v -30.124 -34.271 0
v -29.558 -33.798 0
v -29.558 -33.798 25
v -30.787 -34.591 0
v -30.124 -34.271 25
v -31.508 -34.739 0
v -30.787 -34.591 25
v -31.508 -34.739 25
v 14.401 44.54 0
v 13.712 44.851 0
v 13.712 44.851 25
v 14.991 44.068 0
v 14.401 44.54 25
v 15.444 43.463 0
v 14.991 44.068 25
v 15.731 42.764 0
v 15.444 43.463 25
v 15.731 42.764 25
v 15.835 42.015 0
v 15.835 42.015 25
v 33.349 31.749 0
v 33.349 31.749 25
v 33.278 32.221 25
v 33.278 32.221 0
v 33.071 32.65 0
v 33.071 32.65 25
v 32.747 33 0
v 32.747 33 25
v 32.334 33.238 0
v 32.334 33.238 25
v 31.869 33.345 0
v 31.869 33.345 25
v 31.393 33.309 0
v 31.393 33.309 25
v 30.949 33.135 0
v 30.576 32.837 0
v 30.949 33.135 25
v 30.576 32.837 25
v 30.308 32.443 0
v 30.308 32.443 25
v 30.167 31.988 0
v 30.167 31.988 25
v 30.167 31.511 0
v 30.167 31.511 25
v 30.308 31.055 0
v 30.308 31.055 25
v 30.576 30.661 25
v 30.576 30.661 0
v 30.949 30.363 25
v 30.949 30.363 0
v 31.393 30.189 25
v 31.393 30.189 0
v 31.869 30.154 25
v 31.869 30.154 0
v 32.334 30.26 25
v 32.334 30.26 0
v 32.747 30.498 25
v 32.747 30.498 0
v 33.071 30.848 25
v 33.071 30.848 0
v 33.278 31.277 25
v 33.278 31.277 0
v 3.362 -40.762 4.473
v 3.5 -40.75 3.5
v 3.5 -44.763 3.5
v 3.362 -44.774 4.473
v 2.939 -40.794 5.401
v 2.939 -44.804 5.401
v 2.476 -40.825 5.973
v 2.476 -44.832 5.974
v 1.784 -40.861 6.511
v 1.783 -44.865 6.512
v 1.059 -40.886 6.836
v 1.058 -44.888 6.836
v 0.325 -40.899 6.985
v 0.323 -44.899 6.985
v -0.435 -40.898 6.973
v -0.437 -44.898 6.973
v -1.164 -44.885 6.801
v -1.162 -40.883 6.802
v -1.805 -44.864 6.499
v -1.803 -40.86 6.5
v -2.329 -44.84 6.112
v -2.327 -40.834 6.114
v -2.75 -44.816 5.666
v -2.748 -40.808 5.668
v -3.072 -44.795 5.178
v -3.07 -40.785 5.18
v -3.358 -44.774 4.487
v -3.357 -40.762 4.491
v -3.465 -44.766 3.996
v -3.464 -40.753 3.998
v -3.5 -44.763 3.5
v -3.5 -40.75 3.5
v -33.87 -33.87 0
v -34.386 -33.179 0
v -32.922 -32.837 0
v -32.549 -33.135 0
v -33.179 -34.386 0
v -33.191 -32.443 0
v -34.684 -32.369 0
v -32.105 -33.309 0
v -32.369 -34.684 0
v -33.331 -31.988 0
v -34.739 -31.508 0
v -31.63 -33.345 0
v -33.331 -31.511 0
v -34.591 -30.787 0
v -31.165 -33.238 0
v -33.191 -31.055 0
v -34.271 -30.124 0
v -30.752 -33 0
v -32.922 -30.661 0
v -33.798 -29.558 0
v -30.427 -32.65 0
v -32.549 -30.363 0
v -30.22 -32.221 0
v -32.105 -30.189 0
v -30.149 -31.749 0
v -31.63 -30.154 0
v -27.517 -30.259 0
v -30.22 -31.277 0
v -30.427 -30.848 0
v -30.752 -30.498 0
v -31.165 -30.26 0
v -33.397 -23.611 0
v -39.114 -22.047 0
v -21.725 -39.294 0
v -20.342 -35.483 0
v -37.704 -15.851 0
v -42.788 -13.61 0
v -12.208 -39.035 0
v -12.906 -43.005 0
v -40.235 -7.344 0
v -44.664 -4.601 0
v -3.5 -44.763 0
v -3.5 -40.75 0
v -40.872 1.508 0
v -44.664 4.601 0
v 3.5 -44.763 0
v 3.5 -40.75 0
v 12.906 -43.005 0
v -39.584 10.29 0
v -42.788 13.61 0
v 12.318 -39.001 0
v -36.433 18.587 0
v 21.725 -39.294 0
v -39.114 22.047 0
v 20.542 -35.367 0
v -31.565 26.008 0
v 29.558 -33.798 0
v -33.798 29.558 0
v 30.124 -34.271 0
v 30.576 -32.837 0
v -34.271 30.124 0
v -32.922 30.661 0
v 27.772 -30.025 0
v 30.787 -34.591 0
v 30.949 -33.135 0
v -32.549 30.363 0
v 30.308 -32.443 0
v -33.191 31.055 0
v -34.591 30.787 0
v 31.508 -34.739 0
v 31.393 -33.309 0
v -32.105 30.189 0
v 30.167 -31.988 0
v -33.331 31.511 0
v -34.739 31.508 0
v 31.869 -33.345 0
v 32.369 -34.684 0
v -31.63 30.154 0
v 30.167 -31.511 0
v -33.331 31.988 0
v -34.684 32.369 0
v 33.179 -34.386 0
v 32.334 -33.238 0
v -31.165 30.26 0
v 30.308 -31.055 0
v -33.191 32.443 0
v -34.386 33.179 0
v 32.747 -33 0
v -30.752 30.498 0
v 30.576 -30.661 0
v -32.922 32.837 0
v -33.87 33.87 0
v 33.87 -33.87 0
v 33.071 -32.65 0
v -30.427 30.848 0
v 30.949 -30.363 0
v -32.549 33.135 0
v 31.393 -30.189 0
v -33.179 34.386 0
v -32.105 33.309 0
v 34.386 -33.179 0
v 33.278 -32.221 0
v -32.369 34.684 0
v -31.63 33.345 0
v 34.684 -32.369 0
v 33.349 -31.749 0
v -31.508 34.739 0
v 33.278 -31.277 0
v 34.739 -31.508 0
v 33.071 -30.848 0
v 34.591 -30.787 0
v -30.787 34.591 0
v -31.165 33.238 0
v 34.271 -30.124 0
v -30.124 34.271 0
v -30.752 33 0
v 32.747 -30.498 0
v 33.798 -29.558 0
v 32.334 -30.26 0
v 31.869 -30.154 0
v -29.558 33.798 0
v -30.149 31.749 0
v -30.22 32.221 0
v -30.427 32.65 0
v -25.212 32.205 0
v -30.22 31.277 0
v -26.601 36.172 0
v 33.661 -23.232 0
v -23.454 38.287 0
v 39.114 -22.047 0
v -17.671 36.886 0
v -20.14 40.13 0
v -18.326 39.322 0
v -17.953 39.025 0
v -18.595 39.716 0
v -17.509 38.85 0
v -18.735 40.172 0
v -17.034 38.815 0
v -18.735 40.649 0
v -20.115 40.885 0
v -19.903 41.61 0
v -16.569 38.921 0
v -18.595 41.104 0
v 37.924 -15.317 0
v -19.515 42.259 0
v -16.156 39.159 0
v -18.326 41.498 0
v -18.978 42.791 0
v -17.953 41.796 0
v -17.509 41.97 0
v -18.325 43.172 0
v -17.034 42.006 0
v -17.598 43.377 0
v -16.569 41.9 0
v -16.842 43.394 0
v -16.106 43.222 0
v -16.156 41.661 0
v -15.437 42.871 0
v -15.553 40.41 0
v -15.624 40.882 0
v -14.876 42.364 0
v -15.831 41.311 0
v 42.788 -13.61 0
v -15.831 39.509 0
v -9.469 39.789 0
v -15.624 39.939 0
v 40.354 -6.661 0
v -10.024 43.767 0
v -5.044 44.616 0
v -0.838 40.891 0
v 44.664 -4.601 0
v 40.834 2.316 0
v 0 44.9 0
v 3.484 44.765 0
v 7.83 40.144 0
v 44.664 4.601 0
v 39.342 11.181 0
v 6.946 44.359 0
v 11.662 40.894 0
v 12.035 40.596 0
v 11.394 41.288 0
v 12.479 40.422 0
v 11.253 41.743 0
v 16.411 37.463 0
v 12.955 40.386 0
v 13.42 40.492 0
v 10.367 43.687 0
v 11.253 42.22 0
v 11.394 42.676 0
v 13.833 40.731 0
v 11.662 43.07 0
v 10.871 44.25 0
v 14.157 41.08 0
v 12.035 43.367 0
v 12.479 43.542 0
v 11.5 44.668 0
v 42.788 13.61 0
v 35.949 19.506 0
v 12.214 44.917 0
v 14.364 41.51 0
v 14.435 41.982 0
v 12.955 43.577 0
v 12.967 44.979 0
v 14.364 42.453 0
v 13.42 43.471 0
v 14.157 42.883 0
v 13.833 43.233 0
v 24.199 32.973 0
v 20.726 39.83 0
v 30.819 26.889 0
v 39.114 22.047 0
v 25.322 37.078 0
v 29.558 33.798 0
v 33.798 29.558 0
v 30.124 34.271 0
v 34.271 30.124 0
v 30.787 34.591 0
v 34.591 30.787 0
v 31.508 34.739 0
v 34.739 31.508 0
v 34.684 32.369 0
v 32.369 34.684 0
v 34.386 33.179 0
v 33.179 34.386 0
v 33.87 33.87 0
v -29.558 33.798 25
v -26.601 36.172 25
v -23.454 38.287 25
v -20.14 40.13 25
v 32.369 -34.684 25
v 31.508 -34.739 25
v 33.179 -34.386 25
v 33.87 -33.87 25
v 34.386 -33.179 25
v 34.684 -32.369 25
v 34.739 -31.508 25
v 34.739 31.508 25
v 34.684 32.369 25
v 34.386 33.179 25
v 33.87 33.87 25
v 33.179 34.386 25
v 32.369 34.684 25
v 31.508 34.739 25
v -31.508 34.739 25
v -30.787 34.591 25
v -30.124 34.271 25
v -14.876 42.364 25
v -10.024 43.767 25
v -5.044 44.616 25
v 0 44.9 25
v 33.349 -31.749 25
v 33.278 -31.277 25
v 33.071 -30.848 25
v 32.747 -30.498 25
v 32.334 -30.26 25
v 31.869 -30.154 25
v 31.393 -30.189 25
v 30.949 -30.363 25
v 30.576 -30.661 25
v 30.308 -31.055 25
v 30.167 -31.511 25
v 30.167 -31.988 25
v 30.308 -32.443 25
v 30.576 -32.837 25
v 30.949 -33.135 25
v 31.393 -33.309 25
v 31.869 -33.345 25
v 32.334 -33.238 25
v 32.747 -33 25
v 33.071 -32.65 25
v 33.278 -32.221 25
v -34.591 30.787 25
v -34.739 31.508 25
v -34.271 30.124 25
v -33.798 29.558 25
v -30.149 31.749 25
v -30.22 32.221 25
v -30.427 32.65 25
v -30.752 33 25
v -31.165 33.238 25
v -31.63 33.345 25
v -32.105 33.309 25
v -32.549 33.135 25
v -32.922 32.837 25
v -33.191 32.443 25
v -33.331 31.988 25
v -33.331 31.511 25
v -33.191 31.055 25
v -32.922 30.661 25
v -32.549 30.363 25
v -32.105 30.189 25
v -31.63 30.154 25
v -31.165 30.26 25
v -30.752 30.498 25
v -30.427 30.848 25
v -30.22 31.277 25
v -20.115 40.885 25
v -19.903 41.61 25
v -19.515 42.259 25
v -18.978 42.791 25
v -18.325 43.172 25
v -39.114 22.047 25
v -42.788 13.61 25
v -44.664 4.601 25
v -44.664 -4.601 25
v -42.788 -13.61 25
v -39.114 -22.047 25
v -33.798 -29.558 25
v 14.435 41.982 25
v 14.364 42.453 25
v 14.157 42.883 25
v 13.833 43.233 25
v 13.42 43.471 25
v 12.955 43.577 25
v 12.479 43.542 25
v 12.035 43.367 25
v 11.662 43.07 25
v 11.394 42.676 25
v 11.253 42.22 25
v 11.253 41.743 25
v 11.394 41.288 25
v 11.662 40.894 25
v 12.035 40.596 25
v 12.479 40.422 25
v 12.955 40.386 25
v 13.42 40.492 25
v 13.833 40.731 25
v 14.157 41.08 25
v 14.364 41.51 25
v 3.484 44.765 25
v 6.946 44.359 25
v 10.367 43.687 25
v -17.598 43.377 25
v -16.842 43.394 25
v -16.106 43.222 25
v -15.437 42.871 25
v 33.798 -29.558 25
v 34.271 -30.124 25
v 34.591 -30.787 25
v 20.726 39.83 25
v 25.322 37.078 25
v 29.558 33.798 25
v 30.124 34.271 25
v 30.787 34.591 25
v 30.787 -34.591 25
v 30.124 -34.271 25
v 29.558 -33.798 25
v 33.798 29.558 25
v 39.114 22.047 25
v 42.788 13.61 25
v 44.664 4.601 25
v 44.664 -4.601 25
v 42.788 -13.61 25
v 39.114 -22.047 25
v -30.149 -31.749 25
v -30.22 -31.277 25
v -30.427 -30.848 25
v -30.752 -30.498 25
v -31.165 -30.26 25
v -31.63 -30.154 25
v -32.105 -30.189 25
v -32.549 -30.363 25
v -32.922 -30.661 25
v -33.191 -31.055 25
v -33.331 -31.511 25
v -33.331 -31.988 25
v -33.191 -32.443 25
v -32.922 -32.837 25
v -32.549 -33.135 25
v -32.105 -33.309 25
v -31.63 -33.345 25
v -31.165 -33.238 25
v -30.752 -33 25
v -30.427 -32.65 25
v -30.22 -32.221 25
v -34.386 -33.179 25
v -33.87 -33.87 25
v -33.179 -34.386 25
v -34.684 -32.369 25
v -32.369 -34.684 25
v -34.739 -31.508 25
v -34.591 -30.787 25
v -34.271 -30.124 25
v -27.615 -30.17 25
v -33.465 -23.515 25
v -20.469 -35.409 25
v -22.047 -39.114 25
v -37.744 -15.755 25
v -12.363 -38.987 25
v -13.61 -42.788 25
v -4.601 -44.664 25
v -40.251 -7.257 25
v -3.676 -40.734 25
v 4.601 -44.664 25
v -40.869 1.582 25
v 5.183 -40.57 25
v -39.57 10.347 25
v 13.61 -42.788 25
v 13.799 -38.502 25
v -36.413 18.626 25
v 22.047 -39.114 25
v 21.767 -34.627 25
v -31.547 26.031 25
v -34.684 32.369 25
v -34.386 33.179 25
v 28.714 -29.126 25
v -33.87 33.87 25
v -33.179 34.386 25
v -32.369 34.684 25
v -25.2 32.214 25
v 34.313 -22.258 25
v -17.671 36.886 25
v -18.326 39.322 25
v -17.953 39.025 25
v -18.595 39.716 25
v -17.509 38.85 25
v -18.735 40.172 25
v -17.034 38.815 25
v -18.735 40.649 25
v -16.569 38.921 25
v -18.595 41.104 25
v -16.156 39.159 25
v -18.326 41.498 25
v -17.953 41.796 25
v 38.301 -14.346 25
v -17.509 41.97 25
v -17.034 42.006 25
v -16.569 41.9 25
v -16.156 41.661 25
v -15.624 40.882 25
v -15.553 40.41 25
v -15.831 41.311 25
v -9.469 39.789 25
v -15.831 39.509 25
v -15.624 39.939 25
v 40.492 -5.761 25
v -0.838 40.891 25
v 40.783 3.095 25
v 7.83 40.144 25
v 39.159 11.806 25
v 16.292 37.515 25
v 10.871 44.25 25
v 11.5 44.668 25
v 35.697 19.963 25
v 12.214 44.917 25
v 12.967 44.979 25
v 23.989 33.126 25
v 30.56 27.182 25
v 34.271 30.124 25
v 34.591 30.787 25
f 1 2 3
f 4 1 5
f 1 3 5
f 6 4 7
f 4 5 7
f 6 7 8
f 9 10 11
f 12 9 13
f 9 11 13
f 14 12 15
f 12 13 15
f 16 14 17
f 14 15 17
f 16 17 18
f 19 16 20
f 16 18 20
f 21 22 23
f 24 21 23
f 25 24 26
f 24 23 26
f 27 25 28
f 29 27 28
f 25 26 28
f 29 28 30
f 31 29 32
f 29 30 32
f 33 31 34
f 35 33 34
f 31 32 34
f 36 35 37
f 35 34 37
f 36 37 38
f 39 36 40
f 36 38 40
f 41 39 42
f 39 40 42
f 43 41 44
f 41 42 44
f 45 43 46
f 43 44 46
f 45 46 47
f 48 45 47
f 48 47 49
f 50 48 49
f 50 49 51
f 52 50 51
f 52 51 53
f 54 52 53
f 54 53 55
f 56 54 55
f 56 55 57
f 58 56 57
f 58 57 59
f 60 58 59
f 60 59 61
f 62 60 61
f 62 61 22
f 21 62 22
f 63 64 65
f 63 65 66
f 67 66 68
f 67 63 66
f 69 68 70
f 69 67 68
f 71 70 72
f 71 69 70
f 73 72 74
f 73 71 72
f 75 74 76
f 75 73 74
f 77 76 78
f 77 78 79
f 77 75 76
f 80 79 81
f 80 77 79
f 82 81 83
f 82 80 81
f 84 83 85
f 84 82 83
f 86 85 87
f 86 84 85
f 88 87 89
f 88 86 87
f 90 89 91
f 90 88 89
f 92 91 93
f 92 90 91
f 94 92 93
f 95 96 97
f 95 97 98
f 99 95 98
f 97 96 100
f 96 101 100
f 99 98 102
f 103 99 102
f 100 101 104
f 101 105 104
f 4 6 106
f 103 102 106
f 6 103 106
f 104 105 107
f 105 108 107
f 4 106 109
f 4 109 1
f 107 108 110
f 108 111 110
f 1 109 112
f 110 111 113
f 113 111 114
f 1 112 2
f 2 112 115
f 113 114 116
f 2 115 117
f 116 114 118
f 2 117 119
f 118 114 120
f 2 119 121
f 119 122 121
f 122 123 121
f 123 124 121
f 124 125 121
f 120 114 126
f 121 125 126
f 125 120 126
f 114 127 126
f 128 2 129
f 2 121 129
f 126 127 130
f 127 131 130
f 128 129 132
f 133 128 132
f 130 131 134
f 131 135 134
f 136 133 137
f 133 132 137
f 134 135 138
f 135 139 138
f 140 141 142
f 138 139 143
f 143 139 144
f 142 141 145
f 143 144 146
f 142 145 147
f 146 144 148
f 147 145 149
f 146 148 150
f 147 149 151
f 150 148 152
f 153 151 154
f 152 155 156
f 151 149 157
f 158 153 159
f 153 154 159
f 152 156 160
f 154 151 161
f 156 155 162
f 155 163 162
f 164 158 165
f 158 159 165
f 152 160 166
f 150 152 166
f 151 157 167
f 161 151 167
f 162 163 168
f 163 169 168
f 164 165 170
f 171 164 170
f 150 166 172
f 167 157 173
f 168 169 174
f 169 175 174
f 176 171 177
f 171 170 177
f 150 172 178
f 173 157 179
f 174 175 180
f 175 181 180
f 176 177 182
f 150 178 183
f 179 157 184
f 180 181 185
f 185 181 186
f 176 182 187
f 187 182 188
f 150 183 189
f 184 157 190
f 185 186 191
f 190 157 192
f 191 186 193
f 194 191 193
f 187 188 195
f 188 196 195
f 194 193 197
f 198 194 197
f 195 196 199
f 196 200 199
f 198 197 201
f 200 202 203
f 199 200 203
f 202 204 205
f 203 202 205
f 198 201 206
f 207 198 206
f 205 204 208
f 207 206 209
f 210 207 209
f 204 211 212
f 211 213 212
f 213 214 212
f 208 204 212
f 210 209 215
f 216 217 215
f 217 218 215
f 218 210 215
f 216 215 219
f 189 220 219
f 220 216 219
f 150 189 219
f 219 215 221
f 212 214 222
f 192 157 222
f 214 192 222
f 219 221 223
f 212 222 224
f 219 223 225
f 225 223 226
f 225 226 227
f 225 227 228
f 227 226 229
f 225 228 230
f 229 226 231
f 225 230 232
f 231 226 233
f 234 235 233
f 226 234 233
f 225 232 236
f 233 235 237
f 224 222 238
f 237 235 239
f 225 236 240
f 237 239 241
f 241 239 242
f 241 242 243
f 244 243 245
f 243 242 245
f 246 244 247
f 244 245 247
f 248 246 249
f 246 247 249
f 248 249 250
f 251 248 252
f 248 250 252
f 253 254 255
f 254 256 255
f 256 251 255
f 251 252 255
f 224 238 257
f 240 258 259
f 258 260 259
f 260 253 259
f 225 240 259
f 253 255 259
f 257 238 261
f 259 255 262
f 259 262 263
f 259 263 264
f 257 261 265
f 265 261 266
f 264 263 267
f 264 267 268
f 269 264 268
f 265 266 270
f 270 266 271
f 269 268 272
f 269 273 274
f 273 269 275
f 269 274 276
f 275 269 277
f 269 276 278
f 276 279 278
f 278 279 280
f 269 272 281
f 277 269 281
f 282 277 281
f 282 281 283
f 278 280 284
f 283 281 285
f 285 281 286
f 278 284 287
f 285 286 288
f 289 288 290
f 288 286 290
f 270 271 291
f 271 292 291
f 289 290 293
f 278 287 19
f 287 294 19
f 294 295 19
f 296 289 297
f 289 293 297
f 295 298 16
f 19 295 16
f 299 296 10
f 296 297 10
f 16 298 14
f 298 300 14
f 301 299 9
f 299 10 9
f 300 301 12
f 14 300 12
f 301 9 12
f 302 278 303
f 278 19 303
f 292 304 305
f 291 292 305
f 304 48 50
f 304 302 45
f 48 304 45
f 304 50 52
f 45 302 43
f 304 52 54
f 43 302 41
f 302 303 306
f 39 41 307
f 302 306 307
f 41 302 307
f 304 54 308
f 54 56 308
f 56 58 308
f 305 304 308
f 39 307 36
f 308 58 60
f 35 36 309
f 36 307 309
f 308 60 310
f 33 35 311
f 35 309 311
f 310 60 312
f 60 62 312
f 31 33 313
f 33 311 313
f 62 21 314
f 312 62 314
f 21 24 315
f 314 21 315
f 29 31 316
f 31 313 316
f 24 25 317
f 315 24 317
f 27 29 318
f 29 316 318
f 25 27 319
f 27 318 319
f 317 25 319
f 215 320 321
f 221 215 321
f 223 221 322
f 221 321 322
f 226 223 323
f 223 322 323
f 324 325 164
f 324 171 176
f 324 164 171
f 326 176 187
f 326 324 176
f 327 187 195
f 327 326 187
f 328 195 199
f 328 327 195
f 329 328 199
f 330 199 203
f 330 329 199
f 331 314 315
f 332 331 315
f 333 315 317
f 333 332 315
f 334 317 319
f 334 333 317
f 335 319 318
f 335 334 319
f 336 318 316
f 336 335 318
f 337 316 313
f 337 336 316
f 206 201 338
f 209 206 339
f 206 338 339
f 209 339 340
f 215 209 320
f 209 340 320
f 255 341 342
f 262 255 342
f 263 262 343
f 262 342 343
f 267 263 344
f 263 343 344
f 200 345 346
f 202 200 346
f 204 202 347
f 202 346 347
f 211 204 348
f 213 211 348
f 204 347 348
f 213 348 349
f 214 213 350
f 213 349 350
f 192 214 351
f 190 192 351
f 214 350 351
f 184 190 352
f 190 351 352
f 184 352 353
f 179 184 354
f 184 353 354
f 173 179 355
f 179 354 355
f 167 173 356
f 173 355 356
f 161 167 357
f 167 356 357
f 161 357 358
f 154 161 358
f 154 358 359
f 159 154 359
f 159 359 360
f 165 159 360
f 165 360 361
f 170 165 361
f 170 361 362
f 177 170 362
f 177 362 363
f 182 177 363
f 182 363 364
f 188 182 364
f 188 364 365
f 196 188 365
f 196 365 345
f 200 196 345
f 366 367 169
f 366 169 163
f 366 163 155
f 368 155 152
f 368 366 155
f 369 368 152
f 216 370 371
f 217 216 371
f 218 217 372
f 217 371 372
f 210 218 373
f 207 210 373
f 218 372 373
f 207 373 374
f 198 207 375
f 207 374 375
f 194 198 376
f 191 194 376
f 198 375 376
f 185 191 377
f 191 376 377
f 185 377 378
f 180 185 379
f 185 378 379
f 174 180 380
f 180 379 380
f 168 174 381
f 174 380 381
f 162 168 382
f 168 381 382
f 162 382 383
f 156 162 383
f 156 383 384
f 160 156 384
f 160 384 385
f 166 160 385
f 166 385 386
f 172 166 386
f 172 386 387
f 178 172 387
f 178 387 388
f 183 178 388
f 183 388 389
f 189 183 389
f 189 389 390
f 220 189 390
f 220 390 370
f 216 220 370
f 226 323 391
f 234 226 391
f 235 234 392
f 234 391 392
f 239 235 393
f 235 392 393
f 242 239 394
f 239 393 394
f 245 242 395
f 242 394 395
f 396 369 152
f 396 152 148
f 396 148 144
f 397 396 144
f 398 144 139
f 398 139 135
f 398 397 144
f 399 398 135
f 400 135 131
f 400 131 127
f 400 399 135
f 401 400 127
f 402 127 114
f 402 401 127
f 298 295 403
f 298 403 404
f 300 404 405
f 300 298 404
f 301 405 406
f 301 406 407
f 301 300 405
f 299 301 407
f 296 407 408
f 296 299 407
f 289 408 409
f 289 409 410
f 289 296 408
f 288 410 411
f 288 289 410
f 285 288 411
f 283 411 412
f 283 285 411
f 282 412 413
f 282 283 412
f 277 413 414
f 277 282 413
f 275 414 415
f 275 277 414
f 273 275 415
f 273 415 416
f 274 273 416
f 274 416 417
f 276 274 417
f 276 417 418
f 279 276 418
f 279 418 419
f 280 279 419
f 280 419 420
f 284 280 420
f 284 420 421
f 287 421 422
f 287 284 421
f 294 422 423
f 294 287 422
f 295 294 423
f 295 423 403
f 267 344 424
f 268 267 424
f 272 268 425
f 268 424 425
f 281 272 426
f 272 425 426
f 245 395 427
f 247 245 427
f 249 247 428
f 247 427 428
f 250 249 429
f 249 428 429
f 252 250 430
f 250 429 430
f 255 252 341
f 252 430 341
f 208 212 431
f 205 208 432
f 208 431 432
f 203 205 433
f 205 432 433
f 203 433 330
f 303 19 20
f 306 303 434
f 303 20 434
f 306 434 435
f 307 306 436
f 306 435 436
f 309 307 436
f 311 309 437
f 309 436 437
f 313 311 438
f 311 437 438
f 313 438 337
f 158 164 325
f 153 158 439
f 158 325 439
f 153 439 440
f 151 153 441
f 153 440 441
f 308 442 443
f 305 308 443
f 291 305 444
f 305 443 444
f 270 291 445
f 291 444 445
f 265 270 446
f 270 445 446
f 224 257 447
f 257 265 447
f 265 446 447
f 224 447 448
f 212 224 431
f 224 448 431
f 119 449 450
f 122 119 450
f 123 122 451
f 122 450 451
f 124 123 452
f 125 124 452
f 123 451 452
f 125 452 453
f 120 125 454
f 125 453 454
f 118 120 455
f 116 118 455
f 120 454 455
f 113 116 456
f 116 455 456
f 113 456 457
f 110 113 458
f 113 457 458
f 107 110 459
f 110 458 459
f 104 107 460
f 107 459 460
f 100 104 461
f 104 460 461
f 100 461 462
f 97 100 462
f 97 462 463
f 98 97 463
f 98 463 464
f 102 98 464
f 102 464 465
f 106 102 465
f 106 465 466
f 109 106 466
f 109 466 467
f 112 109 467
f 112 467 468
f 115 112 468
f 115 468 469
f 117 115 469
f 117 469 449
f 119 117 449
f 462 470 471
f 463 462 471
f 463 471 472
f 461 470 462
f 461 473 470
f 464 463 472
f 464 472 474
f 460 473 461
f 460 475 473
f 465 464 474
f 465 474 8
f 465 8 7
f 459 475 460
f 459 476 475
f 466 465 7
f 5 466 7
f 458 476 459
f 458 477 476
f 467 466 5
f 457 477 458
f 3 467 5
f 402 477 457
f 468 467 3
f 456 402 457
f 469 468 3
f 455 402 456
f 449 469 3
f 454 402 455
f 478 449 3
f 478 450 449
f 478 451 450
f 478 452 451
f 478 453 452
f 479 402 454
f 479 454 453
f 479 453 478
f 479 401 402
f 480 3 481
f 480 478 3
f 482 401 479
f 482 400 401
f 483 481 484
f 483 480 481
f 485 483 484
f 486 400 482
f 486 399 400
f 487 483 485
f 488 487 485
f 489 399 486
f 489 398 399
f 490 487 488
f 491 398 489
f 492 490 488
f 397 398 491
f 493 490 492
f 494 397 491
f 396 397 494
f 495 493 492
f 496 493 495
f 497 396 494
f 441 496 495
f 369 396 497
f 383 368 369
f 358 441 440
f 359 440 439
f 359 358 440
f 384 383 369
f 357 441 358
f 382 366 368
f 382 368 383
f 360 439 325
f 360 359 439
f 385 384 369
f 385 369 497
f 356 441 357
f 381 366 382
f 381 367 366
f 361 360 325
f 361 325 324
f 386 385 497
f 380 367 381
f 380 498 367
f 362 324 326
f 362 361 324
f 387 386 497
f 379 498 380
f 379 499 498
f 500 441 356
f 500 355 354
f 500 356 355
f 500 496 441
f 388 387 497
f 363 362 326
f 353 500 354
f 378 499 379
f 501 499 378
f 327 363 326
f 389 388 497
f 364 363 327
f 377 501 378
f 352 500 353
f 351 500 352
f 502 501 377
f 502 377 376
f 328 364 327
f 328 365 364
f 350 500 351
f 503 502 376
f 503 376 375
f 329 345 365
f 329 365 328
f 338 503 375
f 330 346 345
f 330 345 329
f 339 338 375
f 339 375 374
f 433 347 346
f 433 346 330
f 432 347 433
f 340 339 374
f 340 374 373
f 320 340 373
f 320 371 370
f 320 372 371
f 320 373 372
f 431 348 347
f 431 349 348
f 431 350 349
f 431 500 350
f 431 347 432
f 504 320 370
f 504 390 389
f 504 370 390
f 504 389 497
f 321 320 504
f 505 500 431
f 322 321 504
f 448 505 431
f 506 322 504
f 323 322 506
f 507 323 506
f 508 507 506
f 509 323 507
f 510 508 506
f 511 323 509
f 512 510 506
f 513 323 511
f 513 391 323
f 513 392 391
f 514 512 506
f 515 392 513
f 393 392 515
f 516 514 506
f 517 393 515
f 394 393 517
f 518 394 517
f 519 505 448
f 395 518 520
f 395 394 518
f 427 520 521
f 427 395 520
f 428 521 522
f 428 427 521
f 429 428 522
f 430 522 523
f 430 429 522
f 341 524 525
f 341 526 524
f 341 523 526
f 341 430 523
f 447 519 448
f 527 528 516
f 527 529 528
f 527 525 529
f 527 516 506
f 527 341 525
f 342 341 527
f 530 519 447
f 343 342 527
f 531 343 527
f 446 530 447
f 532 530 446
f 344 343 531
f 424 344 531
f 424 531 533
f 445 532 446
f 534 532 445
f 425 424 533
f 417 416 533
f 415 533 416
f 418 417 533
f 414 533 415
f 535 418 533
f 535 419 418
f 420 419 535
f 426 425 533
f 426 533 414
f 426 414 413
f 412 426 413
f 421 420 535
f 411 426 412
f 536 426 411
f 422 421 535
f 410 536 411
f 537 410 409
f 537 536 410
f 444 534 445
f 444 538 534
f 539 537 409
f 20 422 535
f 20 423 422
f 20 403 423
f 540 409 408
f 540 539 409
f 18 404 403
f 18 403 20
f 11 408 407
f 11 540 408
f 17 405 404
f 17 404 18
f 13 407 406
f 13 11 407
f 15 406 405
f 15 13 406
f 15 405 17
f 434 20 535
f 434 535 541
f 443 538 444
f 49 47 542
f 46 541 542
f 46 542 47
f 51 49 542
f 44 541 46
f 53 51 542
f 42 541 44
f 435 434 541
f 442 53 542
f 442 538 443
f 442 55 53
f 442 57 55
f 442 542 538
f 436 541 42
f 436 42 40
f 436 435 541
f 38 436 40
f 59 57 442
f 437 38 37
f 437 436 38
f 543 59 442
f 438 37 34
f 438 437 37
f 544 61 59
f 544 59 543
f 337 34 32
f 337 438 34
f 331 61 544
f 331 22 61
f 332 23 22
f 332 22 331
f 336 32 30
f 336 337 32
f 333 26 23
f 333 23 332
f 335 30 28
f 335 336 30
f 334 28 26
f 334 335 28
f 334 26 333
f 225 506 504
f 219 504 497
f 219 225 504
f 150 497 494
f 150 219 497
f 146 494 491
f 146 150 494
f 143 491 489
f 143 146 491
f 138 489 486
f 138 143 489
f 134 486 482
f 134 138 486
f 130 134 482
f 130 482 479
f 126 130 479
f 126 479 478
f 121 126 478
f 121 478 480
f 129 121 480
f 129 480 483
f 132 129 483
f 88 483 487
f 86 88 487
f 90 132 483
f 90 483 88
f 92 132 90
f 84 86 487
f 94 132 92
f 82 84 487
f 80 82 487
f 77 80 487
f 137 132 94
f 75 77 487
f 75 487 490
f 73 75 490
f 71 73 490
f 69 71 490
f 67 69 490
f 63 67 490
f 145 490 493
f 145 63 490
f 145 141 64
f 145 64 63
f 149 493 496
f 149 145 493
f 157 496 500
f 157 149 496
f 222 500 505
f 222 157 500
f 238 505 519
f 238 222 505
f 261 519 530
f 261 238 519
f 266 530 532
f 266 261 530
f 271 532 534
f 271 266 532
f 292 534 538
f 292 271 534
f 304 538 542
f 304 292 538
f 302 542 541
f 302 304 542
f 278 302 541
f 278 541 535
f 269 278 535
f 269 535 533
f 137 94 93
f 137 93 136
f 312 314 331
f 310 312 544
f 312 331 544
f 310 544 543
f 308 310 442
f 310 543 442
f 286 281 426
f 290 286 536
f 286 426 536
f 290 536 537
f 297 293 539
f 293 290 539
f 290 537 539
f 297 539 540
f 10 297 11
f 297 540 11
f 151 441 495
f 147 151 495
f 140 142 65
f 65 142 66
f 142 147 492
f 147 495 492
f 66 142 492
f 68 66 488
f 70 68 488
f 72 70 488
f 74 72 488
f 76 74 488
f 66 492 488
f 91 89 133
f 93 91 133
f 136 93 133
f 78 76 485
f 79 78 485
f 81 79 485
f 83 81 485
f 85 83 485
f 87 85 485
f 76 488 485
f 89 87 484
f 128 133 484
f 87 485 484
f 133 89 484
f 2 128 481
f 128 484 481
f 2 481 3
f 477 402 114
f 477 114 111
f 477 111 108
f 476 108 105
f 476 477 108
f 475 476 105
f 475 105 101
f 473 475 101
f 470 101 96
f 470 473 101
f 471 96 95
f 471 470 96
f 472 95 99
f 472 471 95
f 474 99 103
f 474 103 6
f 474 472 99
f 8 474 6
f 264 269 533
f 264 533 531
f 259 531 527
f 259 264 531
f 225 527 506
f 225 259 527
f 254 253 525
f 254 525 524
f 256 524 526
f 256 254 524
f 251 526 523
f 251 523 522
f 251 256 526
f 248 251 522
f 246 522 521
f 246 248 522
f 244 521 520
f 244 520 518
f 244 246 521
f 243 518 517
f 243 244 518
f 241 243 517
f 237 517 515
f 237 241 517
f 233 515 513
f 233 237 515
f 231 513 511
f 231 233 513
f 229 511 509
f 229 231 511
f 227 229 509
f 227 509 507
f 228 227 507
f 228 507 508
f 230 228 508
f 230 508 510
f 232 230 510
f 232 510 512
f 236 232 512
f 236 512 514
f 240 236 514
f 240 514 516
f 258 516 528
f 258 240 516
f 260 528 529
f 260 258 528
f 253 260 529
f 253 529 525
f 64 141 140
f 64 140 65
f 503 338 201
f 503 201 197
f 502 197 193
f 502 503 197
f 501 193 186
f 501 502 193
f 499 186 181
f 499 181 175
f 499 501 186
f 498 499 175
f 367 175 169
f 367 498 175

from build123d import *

# Parameters (mm, degrees)
SKETCH_1_R          = 46.9
SKETCH_1_R_2        = 1.6
EXTRUDE_1_DEPTH     = 25
SKETCH_2_R          = 3
EXTRUDE_2_DEPTH     = 25
SKETCH_3_R          = 1.6
CUT_EXTRUDE_1_DEPTH = 71.881732484
CUT_EXTRUDE_2_DEPTH = 71.881732484
CUT_EXTRUDE_3_DEPTH = 69.296196254


with BuildPart() as part:
    # 草图1 → 凸台-拉伸1 (new body)
    with BuildSketch(Plane.XY):
        Circle(SKETCH_1_R)
        with Locations((12.835117837, 41.981778787)):
            Circle(SKETCH_1_R_2, mode=Mode.SUBTRACT)
        with Locations((-17.153096541, 40.410163067)):
            Circle(SKETCH_1_R_2, mode=Mode.SUBTRACT)
        with BuildLine():
            ThreePointArc((-17.670567057, 36.885783981), (5.183019571, -40.570263841), (7.829749303, 40.143555222))
            ThreePointArc((7.829749303, 40.143555222), (-5.183019571, 40.570263841), (-17.670567057, 36.885783981))
        make_face(mode=Mode.SUBTRACT)
    extrude(amount=EXTRUDE_1_DEPTH)

    # 草图2 → 凸台-拉伸2 (add)
    with BuildSketch(Plane.XY.offset(25)):
        with Locations((-31.749094475, 31.749094475)):
            Circle(SKETCH_2_R)
        with Locations((31.749094475, 31.749094475)):
            Circle(SKETCH_2_R)
        with Locations((31.749094475, -31.749094475)):
            Circle(SKETCH_2_R)
        with Locations((-31.749094475, -31.749094475)):
            Circle(SKETCH_2_R)
    extrude(amount=-EXTRUDE_2_DEPTH)

    # 草图3 → 切除-拉伸1 (cut, through all)
    with BuildSketch(Plane.XY.offset(25)):
        with Locations((-31.749094475, 31.749094475)):
            Circle(SKETCH_3_R)
        with Locations((-31.749094475, -31.749094475)):
            Circle(SKETCH_3_R)
        with Locations((31.749094475, -31.749094475)):
            Circle(SKETCH_3_R)
        with Locations((31.749094475, 31.749094475)):
            Circle(SKETCH_3_R)
    extrude(amount=-CUT_EXTRUDE_1_DEPTH, mode=Mode.SUBTRACT)

    # 草图4 → 切除-拉伸2 (cut, through all)
    with BuildSketch(Plane.XY.offset(25)):
        with BuildLine():
            ThreePointArc((-20.139957039, 40.129691383), (-19.72949951, 41.947091088), (-18.325289842, 43.171677663))
            ThreePointArc((-18.325289842, 43.171677663), (-25.271051352, 39.509289586), (-31.508446668, 34.739427004))
            ThreePointArc((-31.508446668, 34.739427004), (-30.445394472, 34.451013479), (-29.558090066, 33.798362559))
            ThreePointArc((-29.558090066, 33.798362559), (-25.049858336, 37.262777638), (-20.139957039, 40.129691383))
        make_face()
        with BuildLine():
            ThreePointArc((-14.876494449, 42.363898698), (-7.545559902, 44.261433842), (0, 44.9))
            Line((0, 44.9), (0, 46.9))
            ThreePointArc((0, 46.9), (-9.350356079, 45.958468656), (-18.325289842, 43.171677663))
            ThreePointArc((-18.325289842, 43.171677663), (-16.468950059, 43.331112158), (-14.876494449, 42.363898698))
        make_face()
        with BuildLine():
            ThreePointArc((31.508446668, 34.739427004), (23.168662113, 40.777727939), (13.712233545, 44.850692873))
            ThreePointArc((13.712233545, 44.850692873), (15.23675449, 43.779594513), (15.834933275, 42.015055494))
            ThreePointArc((15.834933275, 42.015055494), (23.065345276, 38.522718586), (29.558090066, 33.798362559))
            ThreePointArc((29.558090066, 33.798362559), (30.445394472, 34.451013479), (31.508446668, 34.739427004))
        make_face()
        with BuildLine():
            Line((0, 46.9), (0, 44.9))
            ThreePointArc((0, 44.9), (5.218754509, 44.595679178), (10.366766227, 43.686841932))
            ThreePointArc((10.366766227, 43.686841932), (11.849397199, 44.81521395), (13.712233545, 44.850692873))
            ThreePointArc((13.712233545, 44.850692873), (6.932261689, 46.384843946), (0, 46.9))
        make_face()
        with BuildLine():
            ThreePointArc((34.739427004, 31.508446668), (34.451013479, 30.445394472), (33.798362559, 29.558090066))
            ThreePointArc((33.798362559, 29.558090066), (44.9, 0), (33.798362559, -29.558090066))
            ThreePointArc((33.798362559, -29.558090066), (34.451013479, -30.445394472), (34.739427004, -31.508446668))
            ThreePointArc((34.739427004, -31.508446668), (46.9, 0), (34.739427004, 31.508446668))
        make_face()
        with BuildLine():
            ThreePointArc((31.508446668, -34.739427004), (30.445394472, -34.451013479), (29.558090066, -33.798362559))
            ThreePointArc((29.558090066, -33.798362559), (0, -44.9), (-29.558090066, -33.798362559))
            ThreePointArc((-29.558090066, -33.798362559), (-30.445394472, -34.451013479), (-31.508446668, -34.739427004))
            ThreePointArc((-31.508446668, -34.739427004), (0, -46.9), (31.508446668, -34.739427004))
        make_face()
        with BuildLine():
            ThreePointArc((-33.798362559, 29.558090066), (-44.9, 0), (-33.798362559, -29.558090066))
            ThreePointArc((-33.798362559, -29.558090066), (-34.451013479, -30.445394472), (-34.739427004, -31.508446668))
            ThreePointArc((-34.739427004, -31.508446668), (-46.9, 0), (-34.739427004, 31.508446668))
            ThreePointArc((-34.739427004, 31.508446668), (-34.451013479, 30.445394472), (-33.798362559, 29.558090066))
        make_face()
    extrude(amount=-CUT_EXTRUDE_2_DEPTH, mode=Mode.SUBTRACT)

    # 草图6 → 切除-拉伸3 (cut, through all)
    with BuildSketch(Plane(origin=(0, 0, 0), x_dir=(1, 0, 0), z_dir=(0, 1, 0))):
        with BuildLine():
            Line((-3.5, -3.5), (-3.5, 0))
            Line((-3.5, 0), (3.5, 0))
            Line((3.5, 0), (3.5, -3.5))
            ThreePointArc((3.5, -3.5), (0, -7), (-3.5, -3.5))
        make_face()
    extrude(amount=-CUT_EXTRUDE_3_DEPTH, mode=Mode.SUBTRACT)


solid = part.part
